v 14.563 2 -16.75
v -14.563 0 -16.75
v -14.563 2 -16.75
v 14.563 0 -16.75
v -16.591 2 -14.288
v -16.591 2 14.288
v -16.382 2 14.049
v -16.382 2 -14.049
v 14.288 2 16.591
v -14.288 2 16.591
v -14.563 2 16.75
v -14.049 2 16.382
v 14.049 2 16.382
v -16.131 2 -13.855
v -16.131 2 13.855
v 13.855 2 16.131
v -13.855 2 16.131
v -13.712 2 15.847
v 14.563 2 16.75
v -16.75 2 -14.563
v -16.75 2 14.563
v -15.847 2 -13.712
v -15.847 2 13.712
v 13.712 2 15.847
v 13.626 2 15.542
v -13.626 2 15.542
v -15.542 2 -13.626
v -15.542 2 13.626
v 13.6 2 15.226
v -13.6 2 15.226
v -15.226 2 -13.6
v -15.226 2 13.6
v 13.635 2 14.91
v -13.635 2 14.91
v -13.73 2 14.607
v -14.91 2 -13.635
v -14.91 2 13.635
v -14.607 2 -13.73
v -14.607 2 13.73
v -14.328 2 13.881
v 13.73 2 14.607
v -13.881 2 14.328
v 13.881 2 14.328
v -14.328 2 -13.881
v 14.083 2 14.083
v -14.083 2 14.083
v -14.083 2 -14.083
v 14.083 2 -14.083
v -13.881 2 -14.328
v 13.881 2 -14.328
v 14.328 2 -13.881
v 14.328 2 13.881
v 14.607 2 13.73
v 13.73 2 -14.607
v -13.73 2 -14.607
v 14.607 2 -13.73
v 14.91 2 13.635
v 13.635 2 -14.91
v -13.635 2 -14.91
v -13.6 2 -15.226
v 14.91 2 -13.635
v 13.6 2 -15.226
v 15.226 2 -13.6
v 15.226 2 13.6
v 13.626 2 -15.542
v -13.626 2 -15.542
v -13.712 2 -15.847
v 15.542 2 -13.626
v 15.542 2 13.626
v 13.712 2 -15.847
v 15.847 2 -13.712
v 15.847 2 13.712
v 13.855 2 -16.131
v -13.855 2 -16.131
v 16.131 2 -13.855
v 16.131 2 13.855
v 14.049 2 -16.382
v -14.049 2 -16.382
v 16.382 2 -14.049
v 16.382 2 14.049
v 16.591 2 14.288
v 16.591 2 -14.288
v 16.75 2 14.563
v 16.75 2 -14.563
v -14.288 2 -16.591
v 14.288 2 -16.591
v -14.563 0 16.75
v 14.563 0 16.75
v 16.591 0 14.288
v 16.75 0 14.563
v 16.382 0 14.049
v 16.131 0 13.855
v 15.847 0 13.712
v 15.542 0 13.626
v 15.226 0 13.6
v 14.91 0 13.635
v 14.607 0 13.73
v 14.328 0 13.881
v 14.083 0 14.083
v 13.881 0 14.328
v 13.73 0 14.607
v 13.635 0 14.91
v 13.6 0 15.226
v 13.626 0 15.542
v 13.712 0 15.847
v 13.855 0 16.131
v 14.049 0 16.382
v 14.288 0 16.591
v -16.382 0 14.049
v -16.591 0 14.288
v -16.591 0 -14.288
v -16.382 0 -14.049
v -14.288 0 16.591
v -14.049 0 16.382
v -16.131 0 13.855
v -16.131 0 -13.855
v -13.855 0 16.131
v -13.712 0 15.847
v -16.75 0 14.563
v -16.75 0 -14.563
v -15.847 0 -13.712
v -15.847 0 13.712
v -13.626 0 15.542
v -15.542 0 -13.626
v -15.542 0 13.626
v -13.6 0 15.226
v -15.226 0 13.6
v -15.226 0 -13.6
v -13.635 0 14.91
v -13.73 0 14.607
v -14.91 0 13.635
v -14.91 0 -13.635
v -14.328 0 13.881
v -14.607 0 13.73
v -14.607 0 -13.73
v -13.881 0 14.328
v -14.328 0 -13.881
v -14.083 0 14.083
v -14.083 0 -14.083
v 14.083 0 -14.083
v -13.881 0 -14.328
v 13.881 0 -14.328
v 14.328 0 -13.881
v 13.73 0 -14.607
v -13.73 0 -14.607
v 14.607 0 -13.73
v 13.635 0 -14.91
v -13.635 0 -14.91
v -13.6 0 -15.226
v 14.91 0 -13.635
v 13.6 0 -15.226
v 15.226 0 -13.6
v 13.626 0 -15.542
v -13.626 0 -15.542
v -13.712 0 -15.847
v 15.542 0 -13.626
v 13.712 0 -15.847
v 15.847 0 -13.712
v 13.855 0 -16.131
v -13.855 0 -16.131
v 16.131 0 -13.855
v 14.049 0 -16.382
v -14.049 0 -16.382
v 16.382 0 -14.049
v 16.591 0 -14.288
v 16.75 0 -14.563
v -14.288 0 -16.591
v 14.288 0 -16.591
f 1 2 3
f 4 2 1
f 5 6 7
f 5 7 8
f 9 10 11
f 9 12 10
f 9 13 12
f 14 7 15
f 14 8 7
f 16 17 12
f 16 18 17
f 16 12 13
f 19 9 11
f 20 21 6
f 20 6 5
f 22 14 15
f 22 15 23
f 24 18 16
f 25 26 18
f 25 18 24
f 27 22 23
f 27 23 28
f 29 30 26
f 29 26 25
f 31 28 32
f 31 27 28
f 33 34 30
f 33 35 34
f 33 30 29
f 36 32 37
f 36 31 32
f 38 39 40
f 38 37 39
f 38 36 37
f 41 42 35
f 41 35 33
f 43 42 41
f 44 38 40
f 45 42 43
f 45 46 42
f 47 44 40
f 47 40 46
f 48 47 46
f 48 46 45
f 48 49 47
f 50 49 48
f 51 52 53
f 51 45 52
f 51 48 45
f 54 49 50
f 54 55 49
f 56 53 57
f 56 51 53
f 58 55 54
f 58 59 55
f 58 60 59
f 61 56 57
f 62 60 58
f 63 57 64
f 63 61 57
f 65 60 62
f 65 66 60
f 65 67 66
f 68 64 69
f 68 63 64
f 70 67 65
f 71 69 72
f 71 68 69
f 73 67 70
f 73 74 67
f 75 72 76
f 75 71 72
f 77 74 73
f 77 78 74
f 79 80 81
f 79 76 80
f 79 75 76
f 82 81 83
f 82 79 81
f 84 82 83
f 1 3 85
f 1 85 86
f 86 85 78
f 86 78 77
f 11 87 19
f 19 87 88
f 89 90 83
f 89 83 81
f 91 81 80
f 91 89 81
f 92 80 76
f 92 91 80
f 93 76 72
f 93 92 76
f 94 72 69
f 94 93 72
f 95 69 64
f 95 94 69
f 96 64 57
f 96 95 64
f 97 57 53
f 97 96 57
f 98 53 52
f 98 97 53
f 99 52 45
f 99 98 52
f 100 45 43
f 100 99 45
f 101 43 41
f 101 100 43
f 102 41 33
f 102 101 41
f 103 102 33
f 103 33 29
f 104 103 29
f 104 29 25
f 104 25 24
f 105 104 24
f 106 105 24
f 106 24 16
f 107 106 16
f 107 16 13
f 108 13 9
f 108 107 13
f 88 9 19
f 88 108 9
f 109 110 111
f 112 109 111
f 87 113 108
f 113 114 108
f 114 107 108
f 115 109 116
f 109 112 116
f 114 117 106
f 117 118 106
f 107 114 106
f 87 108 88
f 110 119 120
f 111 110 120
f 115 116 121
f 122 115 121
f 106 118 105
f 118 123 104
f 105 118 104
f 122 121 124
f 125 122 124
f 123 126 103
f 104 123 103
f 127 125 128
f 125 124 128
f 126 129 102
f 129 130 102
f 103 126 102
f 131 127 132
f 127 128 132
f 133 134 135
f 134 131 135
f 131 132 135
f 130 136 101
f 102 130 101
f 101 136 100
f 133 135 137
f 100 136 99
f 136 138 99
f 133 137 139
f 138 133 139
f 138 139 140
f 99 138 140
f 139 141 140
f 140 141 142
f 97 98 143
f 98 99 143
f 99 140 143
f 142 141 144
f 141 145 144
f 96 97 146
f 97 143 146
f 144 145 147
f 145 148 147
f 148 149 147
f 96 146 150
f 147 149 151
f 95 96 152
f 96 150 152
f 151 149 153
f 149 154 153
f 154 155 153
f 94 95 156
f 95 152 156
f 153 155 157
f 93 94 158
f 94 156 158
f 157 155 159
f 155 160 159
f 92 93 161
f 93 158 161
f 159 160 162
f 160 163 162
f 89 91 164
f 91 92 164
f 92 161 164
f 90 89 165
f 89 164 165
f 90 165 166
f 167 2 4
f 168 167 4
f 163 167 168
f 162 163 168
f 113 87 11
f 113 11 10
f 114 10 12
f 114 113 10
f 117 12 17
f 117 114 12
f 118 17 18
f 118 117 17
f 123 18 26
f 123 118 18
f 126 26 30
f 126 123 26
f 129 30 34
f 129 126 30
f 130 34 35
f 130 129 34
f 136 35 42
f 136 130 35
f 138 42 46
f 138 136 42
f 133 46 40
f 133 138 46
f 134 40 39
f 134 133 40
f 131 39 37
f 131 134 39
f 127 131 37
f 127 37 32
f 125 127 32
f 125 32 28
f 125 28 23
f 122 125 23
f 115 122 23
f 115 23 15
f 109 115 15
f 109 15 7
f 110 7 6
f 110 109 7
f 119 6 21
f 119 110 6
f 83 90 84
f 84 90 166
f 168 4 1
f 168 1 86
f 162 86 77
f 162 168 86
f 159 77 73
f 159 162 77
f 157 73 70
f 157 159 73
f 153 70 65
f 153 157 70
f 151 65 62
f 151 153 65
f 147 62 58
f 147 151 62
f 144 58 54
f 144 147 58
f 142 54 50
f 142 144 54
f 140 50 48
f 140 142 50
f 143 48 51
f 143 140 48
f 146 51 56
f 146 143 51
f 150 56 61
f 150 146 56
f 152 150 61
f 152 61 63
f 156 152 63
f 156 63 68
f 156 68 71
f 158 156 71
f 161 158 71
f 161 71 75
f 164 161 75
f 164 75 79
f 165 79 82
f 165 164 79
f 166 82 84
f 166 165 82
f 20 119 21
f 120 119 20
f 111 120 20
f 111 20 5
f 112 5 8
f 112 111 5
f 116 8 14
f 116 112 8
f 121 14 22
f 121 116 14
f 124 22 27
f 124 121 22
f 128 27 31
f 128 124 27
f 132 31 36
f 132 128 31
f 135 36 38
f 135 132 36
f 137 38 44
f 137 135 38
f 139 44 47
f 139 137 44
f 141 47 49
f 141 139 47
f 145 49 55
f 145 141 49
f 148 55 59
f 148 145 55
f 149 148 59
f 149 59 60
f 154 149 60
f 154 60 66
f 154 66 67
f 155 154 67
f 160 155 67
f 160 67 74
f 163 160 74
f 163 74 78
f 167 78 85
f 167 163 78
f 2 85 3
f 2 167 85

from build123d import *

# Parameters (mm, degrees)
SKETCH2_W             = 33.5
SKETCH2_H             = 33.5
BOSS_EXTRUDE1_DEPTH   = 2
M4_TAPPED_HOLE1_DEPTH = 2


# Read off the part's stored shape, not the designer's step: M4 Tapped Hole1
with BuildPart() as part:
    # Sketch2 → Boss-Extrude1 (new body)
    with BuildSketch(Plane(origin=(0, 0, 0), x_dir=(1, 0, 0), z_dir=(0, 1, 0))):
        Rectangle(SKETCH2_W, SKETCH2_H)
    extrude(amount=BOSS_EXTRUDE1_DEPTH)

    # M4 Tapped Hole1 outline → M4 Tapped Hole1 (cut)
    with BuildSketch(Plane(origin=(0, 0, 0), x_dir=(1, 0, 0), z_dir=(0, 1, 0))):
        with BuildLine():
            Line((16.75, -16.75), (16.75, -14.562613646))
            ThreePointArc((16.75, -14.562613646), (14.083273811, -14.083273811), (14.562613646, -16.75))
            Line((14.562613646, -16.75), (16.75, -16.75))
        make_face()
        with BuildLine():
            ThreePointArc((14.562613646, 16.75), (14.083273811, 14.083273811), (16.75, 14.562613646))
            Line((16.75, 14.562613646), (16.75, 16.75))
            Line((16.75, 16.75), (14.562613646, 16.75))
        make_face()
        with BuildLine():
            Line((-16.75, -16.75), (-14.562613646, -16.75))
            ThreePointArc((-14.562613646, -16.75), (-14.083273811, -14.083273811), (-16.75, -14.562613646))
            Line((-16.75, -14.562613646), (-16.75, -16.75))
        make_face()
        with BuildLine():
            ThreePointArc((-16.75, 14.562613646), (-14.083273811, 14.083273811), (-14.562613646, 16.75))
            Line((-14.562613646, 16.75), (-16.75, 16.75))
            Line((-16.75, 16.75), (-16.75, 14.562613646))
        make_face()
    extrude(amount=M4_TAPPED_HOLE1_DEPTH, mode=Mode.SUBTRACT)


solid = part.part
